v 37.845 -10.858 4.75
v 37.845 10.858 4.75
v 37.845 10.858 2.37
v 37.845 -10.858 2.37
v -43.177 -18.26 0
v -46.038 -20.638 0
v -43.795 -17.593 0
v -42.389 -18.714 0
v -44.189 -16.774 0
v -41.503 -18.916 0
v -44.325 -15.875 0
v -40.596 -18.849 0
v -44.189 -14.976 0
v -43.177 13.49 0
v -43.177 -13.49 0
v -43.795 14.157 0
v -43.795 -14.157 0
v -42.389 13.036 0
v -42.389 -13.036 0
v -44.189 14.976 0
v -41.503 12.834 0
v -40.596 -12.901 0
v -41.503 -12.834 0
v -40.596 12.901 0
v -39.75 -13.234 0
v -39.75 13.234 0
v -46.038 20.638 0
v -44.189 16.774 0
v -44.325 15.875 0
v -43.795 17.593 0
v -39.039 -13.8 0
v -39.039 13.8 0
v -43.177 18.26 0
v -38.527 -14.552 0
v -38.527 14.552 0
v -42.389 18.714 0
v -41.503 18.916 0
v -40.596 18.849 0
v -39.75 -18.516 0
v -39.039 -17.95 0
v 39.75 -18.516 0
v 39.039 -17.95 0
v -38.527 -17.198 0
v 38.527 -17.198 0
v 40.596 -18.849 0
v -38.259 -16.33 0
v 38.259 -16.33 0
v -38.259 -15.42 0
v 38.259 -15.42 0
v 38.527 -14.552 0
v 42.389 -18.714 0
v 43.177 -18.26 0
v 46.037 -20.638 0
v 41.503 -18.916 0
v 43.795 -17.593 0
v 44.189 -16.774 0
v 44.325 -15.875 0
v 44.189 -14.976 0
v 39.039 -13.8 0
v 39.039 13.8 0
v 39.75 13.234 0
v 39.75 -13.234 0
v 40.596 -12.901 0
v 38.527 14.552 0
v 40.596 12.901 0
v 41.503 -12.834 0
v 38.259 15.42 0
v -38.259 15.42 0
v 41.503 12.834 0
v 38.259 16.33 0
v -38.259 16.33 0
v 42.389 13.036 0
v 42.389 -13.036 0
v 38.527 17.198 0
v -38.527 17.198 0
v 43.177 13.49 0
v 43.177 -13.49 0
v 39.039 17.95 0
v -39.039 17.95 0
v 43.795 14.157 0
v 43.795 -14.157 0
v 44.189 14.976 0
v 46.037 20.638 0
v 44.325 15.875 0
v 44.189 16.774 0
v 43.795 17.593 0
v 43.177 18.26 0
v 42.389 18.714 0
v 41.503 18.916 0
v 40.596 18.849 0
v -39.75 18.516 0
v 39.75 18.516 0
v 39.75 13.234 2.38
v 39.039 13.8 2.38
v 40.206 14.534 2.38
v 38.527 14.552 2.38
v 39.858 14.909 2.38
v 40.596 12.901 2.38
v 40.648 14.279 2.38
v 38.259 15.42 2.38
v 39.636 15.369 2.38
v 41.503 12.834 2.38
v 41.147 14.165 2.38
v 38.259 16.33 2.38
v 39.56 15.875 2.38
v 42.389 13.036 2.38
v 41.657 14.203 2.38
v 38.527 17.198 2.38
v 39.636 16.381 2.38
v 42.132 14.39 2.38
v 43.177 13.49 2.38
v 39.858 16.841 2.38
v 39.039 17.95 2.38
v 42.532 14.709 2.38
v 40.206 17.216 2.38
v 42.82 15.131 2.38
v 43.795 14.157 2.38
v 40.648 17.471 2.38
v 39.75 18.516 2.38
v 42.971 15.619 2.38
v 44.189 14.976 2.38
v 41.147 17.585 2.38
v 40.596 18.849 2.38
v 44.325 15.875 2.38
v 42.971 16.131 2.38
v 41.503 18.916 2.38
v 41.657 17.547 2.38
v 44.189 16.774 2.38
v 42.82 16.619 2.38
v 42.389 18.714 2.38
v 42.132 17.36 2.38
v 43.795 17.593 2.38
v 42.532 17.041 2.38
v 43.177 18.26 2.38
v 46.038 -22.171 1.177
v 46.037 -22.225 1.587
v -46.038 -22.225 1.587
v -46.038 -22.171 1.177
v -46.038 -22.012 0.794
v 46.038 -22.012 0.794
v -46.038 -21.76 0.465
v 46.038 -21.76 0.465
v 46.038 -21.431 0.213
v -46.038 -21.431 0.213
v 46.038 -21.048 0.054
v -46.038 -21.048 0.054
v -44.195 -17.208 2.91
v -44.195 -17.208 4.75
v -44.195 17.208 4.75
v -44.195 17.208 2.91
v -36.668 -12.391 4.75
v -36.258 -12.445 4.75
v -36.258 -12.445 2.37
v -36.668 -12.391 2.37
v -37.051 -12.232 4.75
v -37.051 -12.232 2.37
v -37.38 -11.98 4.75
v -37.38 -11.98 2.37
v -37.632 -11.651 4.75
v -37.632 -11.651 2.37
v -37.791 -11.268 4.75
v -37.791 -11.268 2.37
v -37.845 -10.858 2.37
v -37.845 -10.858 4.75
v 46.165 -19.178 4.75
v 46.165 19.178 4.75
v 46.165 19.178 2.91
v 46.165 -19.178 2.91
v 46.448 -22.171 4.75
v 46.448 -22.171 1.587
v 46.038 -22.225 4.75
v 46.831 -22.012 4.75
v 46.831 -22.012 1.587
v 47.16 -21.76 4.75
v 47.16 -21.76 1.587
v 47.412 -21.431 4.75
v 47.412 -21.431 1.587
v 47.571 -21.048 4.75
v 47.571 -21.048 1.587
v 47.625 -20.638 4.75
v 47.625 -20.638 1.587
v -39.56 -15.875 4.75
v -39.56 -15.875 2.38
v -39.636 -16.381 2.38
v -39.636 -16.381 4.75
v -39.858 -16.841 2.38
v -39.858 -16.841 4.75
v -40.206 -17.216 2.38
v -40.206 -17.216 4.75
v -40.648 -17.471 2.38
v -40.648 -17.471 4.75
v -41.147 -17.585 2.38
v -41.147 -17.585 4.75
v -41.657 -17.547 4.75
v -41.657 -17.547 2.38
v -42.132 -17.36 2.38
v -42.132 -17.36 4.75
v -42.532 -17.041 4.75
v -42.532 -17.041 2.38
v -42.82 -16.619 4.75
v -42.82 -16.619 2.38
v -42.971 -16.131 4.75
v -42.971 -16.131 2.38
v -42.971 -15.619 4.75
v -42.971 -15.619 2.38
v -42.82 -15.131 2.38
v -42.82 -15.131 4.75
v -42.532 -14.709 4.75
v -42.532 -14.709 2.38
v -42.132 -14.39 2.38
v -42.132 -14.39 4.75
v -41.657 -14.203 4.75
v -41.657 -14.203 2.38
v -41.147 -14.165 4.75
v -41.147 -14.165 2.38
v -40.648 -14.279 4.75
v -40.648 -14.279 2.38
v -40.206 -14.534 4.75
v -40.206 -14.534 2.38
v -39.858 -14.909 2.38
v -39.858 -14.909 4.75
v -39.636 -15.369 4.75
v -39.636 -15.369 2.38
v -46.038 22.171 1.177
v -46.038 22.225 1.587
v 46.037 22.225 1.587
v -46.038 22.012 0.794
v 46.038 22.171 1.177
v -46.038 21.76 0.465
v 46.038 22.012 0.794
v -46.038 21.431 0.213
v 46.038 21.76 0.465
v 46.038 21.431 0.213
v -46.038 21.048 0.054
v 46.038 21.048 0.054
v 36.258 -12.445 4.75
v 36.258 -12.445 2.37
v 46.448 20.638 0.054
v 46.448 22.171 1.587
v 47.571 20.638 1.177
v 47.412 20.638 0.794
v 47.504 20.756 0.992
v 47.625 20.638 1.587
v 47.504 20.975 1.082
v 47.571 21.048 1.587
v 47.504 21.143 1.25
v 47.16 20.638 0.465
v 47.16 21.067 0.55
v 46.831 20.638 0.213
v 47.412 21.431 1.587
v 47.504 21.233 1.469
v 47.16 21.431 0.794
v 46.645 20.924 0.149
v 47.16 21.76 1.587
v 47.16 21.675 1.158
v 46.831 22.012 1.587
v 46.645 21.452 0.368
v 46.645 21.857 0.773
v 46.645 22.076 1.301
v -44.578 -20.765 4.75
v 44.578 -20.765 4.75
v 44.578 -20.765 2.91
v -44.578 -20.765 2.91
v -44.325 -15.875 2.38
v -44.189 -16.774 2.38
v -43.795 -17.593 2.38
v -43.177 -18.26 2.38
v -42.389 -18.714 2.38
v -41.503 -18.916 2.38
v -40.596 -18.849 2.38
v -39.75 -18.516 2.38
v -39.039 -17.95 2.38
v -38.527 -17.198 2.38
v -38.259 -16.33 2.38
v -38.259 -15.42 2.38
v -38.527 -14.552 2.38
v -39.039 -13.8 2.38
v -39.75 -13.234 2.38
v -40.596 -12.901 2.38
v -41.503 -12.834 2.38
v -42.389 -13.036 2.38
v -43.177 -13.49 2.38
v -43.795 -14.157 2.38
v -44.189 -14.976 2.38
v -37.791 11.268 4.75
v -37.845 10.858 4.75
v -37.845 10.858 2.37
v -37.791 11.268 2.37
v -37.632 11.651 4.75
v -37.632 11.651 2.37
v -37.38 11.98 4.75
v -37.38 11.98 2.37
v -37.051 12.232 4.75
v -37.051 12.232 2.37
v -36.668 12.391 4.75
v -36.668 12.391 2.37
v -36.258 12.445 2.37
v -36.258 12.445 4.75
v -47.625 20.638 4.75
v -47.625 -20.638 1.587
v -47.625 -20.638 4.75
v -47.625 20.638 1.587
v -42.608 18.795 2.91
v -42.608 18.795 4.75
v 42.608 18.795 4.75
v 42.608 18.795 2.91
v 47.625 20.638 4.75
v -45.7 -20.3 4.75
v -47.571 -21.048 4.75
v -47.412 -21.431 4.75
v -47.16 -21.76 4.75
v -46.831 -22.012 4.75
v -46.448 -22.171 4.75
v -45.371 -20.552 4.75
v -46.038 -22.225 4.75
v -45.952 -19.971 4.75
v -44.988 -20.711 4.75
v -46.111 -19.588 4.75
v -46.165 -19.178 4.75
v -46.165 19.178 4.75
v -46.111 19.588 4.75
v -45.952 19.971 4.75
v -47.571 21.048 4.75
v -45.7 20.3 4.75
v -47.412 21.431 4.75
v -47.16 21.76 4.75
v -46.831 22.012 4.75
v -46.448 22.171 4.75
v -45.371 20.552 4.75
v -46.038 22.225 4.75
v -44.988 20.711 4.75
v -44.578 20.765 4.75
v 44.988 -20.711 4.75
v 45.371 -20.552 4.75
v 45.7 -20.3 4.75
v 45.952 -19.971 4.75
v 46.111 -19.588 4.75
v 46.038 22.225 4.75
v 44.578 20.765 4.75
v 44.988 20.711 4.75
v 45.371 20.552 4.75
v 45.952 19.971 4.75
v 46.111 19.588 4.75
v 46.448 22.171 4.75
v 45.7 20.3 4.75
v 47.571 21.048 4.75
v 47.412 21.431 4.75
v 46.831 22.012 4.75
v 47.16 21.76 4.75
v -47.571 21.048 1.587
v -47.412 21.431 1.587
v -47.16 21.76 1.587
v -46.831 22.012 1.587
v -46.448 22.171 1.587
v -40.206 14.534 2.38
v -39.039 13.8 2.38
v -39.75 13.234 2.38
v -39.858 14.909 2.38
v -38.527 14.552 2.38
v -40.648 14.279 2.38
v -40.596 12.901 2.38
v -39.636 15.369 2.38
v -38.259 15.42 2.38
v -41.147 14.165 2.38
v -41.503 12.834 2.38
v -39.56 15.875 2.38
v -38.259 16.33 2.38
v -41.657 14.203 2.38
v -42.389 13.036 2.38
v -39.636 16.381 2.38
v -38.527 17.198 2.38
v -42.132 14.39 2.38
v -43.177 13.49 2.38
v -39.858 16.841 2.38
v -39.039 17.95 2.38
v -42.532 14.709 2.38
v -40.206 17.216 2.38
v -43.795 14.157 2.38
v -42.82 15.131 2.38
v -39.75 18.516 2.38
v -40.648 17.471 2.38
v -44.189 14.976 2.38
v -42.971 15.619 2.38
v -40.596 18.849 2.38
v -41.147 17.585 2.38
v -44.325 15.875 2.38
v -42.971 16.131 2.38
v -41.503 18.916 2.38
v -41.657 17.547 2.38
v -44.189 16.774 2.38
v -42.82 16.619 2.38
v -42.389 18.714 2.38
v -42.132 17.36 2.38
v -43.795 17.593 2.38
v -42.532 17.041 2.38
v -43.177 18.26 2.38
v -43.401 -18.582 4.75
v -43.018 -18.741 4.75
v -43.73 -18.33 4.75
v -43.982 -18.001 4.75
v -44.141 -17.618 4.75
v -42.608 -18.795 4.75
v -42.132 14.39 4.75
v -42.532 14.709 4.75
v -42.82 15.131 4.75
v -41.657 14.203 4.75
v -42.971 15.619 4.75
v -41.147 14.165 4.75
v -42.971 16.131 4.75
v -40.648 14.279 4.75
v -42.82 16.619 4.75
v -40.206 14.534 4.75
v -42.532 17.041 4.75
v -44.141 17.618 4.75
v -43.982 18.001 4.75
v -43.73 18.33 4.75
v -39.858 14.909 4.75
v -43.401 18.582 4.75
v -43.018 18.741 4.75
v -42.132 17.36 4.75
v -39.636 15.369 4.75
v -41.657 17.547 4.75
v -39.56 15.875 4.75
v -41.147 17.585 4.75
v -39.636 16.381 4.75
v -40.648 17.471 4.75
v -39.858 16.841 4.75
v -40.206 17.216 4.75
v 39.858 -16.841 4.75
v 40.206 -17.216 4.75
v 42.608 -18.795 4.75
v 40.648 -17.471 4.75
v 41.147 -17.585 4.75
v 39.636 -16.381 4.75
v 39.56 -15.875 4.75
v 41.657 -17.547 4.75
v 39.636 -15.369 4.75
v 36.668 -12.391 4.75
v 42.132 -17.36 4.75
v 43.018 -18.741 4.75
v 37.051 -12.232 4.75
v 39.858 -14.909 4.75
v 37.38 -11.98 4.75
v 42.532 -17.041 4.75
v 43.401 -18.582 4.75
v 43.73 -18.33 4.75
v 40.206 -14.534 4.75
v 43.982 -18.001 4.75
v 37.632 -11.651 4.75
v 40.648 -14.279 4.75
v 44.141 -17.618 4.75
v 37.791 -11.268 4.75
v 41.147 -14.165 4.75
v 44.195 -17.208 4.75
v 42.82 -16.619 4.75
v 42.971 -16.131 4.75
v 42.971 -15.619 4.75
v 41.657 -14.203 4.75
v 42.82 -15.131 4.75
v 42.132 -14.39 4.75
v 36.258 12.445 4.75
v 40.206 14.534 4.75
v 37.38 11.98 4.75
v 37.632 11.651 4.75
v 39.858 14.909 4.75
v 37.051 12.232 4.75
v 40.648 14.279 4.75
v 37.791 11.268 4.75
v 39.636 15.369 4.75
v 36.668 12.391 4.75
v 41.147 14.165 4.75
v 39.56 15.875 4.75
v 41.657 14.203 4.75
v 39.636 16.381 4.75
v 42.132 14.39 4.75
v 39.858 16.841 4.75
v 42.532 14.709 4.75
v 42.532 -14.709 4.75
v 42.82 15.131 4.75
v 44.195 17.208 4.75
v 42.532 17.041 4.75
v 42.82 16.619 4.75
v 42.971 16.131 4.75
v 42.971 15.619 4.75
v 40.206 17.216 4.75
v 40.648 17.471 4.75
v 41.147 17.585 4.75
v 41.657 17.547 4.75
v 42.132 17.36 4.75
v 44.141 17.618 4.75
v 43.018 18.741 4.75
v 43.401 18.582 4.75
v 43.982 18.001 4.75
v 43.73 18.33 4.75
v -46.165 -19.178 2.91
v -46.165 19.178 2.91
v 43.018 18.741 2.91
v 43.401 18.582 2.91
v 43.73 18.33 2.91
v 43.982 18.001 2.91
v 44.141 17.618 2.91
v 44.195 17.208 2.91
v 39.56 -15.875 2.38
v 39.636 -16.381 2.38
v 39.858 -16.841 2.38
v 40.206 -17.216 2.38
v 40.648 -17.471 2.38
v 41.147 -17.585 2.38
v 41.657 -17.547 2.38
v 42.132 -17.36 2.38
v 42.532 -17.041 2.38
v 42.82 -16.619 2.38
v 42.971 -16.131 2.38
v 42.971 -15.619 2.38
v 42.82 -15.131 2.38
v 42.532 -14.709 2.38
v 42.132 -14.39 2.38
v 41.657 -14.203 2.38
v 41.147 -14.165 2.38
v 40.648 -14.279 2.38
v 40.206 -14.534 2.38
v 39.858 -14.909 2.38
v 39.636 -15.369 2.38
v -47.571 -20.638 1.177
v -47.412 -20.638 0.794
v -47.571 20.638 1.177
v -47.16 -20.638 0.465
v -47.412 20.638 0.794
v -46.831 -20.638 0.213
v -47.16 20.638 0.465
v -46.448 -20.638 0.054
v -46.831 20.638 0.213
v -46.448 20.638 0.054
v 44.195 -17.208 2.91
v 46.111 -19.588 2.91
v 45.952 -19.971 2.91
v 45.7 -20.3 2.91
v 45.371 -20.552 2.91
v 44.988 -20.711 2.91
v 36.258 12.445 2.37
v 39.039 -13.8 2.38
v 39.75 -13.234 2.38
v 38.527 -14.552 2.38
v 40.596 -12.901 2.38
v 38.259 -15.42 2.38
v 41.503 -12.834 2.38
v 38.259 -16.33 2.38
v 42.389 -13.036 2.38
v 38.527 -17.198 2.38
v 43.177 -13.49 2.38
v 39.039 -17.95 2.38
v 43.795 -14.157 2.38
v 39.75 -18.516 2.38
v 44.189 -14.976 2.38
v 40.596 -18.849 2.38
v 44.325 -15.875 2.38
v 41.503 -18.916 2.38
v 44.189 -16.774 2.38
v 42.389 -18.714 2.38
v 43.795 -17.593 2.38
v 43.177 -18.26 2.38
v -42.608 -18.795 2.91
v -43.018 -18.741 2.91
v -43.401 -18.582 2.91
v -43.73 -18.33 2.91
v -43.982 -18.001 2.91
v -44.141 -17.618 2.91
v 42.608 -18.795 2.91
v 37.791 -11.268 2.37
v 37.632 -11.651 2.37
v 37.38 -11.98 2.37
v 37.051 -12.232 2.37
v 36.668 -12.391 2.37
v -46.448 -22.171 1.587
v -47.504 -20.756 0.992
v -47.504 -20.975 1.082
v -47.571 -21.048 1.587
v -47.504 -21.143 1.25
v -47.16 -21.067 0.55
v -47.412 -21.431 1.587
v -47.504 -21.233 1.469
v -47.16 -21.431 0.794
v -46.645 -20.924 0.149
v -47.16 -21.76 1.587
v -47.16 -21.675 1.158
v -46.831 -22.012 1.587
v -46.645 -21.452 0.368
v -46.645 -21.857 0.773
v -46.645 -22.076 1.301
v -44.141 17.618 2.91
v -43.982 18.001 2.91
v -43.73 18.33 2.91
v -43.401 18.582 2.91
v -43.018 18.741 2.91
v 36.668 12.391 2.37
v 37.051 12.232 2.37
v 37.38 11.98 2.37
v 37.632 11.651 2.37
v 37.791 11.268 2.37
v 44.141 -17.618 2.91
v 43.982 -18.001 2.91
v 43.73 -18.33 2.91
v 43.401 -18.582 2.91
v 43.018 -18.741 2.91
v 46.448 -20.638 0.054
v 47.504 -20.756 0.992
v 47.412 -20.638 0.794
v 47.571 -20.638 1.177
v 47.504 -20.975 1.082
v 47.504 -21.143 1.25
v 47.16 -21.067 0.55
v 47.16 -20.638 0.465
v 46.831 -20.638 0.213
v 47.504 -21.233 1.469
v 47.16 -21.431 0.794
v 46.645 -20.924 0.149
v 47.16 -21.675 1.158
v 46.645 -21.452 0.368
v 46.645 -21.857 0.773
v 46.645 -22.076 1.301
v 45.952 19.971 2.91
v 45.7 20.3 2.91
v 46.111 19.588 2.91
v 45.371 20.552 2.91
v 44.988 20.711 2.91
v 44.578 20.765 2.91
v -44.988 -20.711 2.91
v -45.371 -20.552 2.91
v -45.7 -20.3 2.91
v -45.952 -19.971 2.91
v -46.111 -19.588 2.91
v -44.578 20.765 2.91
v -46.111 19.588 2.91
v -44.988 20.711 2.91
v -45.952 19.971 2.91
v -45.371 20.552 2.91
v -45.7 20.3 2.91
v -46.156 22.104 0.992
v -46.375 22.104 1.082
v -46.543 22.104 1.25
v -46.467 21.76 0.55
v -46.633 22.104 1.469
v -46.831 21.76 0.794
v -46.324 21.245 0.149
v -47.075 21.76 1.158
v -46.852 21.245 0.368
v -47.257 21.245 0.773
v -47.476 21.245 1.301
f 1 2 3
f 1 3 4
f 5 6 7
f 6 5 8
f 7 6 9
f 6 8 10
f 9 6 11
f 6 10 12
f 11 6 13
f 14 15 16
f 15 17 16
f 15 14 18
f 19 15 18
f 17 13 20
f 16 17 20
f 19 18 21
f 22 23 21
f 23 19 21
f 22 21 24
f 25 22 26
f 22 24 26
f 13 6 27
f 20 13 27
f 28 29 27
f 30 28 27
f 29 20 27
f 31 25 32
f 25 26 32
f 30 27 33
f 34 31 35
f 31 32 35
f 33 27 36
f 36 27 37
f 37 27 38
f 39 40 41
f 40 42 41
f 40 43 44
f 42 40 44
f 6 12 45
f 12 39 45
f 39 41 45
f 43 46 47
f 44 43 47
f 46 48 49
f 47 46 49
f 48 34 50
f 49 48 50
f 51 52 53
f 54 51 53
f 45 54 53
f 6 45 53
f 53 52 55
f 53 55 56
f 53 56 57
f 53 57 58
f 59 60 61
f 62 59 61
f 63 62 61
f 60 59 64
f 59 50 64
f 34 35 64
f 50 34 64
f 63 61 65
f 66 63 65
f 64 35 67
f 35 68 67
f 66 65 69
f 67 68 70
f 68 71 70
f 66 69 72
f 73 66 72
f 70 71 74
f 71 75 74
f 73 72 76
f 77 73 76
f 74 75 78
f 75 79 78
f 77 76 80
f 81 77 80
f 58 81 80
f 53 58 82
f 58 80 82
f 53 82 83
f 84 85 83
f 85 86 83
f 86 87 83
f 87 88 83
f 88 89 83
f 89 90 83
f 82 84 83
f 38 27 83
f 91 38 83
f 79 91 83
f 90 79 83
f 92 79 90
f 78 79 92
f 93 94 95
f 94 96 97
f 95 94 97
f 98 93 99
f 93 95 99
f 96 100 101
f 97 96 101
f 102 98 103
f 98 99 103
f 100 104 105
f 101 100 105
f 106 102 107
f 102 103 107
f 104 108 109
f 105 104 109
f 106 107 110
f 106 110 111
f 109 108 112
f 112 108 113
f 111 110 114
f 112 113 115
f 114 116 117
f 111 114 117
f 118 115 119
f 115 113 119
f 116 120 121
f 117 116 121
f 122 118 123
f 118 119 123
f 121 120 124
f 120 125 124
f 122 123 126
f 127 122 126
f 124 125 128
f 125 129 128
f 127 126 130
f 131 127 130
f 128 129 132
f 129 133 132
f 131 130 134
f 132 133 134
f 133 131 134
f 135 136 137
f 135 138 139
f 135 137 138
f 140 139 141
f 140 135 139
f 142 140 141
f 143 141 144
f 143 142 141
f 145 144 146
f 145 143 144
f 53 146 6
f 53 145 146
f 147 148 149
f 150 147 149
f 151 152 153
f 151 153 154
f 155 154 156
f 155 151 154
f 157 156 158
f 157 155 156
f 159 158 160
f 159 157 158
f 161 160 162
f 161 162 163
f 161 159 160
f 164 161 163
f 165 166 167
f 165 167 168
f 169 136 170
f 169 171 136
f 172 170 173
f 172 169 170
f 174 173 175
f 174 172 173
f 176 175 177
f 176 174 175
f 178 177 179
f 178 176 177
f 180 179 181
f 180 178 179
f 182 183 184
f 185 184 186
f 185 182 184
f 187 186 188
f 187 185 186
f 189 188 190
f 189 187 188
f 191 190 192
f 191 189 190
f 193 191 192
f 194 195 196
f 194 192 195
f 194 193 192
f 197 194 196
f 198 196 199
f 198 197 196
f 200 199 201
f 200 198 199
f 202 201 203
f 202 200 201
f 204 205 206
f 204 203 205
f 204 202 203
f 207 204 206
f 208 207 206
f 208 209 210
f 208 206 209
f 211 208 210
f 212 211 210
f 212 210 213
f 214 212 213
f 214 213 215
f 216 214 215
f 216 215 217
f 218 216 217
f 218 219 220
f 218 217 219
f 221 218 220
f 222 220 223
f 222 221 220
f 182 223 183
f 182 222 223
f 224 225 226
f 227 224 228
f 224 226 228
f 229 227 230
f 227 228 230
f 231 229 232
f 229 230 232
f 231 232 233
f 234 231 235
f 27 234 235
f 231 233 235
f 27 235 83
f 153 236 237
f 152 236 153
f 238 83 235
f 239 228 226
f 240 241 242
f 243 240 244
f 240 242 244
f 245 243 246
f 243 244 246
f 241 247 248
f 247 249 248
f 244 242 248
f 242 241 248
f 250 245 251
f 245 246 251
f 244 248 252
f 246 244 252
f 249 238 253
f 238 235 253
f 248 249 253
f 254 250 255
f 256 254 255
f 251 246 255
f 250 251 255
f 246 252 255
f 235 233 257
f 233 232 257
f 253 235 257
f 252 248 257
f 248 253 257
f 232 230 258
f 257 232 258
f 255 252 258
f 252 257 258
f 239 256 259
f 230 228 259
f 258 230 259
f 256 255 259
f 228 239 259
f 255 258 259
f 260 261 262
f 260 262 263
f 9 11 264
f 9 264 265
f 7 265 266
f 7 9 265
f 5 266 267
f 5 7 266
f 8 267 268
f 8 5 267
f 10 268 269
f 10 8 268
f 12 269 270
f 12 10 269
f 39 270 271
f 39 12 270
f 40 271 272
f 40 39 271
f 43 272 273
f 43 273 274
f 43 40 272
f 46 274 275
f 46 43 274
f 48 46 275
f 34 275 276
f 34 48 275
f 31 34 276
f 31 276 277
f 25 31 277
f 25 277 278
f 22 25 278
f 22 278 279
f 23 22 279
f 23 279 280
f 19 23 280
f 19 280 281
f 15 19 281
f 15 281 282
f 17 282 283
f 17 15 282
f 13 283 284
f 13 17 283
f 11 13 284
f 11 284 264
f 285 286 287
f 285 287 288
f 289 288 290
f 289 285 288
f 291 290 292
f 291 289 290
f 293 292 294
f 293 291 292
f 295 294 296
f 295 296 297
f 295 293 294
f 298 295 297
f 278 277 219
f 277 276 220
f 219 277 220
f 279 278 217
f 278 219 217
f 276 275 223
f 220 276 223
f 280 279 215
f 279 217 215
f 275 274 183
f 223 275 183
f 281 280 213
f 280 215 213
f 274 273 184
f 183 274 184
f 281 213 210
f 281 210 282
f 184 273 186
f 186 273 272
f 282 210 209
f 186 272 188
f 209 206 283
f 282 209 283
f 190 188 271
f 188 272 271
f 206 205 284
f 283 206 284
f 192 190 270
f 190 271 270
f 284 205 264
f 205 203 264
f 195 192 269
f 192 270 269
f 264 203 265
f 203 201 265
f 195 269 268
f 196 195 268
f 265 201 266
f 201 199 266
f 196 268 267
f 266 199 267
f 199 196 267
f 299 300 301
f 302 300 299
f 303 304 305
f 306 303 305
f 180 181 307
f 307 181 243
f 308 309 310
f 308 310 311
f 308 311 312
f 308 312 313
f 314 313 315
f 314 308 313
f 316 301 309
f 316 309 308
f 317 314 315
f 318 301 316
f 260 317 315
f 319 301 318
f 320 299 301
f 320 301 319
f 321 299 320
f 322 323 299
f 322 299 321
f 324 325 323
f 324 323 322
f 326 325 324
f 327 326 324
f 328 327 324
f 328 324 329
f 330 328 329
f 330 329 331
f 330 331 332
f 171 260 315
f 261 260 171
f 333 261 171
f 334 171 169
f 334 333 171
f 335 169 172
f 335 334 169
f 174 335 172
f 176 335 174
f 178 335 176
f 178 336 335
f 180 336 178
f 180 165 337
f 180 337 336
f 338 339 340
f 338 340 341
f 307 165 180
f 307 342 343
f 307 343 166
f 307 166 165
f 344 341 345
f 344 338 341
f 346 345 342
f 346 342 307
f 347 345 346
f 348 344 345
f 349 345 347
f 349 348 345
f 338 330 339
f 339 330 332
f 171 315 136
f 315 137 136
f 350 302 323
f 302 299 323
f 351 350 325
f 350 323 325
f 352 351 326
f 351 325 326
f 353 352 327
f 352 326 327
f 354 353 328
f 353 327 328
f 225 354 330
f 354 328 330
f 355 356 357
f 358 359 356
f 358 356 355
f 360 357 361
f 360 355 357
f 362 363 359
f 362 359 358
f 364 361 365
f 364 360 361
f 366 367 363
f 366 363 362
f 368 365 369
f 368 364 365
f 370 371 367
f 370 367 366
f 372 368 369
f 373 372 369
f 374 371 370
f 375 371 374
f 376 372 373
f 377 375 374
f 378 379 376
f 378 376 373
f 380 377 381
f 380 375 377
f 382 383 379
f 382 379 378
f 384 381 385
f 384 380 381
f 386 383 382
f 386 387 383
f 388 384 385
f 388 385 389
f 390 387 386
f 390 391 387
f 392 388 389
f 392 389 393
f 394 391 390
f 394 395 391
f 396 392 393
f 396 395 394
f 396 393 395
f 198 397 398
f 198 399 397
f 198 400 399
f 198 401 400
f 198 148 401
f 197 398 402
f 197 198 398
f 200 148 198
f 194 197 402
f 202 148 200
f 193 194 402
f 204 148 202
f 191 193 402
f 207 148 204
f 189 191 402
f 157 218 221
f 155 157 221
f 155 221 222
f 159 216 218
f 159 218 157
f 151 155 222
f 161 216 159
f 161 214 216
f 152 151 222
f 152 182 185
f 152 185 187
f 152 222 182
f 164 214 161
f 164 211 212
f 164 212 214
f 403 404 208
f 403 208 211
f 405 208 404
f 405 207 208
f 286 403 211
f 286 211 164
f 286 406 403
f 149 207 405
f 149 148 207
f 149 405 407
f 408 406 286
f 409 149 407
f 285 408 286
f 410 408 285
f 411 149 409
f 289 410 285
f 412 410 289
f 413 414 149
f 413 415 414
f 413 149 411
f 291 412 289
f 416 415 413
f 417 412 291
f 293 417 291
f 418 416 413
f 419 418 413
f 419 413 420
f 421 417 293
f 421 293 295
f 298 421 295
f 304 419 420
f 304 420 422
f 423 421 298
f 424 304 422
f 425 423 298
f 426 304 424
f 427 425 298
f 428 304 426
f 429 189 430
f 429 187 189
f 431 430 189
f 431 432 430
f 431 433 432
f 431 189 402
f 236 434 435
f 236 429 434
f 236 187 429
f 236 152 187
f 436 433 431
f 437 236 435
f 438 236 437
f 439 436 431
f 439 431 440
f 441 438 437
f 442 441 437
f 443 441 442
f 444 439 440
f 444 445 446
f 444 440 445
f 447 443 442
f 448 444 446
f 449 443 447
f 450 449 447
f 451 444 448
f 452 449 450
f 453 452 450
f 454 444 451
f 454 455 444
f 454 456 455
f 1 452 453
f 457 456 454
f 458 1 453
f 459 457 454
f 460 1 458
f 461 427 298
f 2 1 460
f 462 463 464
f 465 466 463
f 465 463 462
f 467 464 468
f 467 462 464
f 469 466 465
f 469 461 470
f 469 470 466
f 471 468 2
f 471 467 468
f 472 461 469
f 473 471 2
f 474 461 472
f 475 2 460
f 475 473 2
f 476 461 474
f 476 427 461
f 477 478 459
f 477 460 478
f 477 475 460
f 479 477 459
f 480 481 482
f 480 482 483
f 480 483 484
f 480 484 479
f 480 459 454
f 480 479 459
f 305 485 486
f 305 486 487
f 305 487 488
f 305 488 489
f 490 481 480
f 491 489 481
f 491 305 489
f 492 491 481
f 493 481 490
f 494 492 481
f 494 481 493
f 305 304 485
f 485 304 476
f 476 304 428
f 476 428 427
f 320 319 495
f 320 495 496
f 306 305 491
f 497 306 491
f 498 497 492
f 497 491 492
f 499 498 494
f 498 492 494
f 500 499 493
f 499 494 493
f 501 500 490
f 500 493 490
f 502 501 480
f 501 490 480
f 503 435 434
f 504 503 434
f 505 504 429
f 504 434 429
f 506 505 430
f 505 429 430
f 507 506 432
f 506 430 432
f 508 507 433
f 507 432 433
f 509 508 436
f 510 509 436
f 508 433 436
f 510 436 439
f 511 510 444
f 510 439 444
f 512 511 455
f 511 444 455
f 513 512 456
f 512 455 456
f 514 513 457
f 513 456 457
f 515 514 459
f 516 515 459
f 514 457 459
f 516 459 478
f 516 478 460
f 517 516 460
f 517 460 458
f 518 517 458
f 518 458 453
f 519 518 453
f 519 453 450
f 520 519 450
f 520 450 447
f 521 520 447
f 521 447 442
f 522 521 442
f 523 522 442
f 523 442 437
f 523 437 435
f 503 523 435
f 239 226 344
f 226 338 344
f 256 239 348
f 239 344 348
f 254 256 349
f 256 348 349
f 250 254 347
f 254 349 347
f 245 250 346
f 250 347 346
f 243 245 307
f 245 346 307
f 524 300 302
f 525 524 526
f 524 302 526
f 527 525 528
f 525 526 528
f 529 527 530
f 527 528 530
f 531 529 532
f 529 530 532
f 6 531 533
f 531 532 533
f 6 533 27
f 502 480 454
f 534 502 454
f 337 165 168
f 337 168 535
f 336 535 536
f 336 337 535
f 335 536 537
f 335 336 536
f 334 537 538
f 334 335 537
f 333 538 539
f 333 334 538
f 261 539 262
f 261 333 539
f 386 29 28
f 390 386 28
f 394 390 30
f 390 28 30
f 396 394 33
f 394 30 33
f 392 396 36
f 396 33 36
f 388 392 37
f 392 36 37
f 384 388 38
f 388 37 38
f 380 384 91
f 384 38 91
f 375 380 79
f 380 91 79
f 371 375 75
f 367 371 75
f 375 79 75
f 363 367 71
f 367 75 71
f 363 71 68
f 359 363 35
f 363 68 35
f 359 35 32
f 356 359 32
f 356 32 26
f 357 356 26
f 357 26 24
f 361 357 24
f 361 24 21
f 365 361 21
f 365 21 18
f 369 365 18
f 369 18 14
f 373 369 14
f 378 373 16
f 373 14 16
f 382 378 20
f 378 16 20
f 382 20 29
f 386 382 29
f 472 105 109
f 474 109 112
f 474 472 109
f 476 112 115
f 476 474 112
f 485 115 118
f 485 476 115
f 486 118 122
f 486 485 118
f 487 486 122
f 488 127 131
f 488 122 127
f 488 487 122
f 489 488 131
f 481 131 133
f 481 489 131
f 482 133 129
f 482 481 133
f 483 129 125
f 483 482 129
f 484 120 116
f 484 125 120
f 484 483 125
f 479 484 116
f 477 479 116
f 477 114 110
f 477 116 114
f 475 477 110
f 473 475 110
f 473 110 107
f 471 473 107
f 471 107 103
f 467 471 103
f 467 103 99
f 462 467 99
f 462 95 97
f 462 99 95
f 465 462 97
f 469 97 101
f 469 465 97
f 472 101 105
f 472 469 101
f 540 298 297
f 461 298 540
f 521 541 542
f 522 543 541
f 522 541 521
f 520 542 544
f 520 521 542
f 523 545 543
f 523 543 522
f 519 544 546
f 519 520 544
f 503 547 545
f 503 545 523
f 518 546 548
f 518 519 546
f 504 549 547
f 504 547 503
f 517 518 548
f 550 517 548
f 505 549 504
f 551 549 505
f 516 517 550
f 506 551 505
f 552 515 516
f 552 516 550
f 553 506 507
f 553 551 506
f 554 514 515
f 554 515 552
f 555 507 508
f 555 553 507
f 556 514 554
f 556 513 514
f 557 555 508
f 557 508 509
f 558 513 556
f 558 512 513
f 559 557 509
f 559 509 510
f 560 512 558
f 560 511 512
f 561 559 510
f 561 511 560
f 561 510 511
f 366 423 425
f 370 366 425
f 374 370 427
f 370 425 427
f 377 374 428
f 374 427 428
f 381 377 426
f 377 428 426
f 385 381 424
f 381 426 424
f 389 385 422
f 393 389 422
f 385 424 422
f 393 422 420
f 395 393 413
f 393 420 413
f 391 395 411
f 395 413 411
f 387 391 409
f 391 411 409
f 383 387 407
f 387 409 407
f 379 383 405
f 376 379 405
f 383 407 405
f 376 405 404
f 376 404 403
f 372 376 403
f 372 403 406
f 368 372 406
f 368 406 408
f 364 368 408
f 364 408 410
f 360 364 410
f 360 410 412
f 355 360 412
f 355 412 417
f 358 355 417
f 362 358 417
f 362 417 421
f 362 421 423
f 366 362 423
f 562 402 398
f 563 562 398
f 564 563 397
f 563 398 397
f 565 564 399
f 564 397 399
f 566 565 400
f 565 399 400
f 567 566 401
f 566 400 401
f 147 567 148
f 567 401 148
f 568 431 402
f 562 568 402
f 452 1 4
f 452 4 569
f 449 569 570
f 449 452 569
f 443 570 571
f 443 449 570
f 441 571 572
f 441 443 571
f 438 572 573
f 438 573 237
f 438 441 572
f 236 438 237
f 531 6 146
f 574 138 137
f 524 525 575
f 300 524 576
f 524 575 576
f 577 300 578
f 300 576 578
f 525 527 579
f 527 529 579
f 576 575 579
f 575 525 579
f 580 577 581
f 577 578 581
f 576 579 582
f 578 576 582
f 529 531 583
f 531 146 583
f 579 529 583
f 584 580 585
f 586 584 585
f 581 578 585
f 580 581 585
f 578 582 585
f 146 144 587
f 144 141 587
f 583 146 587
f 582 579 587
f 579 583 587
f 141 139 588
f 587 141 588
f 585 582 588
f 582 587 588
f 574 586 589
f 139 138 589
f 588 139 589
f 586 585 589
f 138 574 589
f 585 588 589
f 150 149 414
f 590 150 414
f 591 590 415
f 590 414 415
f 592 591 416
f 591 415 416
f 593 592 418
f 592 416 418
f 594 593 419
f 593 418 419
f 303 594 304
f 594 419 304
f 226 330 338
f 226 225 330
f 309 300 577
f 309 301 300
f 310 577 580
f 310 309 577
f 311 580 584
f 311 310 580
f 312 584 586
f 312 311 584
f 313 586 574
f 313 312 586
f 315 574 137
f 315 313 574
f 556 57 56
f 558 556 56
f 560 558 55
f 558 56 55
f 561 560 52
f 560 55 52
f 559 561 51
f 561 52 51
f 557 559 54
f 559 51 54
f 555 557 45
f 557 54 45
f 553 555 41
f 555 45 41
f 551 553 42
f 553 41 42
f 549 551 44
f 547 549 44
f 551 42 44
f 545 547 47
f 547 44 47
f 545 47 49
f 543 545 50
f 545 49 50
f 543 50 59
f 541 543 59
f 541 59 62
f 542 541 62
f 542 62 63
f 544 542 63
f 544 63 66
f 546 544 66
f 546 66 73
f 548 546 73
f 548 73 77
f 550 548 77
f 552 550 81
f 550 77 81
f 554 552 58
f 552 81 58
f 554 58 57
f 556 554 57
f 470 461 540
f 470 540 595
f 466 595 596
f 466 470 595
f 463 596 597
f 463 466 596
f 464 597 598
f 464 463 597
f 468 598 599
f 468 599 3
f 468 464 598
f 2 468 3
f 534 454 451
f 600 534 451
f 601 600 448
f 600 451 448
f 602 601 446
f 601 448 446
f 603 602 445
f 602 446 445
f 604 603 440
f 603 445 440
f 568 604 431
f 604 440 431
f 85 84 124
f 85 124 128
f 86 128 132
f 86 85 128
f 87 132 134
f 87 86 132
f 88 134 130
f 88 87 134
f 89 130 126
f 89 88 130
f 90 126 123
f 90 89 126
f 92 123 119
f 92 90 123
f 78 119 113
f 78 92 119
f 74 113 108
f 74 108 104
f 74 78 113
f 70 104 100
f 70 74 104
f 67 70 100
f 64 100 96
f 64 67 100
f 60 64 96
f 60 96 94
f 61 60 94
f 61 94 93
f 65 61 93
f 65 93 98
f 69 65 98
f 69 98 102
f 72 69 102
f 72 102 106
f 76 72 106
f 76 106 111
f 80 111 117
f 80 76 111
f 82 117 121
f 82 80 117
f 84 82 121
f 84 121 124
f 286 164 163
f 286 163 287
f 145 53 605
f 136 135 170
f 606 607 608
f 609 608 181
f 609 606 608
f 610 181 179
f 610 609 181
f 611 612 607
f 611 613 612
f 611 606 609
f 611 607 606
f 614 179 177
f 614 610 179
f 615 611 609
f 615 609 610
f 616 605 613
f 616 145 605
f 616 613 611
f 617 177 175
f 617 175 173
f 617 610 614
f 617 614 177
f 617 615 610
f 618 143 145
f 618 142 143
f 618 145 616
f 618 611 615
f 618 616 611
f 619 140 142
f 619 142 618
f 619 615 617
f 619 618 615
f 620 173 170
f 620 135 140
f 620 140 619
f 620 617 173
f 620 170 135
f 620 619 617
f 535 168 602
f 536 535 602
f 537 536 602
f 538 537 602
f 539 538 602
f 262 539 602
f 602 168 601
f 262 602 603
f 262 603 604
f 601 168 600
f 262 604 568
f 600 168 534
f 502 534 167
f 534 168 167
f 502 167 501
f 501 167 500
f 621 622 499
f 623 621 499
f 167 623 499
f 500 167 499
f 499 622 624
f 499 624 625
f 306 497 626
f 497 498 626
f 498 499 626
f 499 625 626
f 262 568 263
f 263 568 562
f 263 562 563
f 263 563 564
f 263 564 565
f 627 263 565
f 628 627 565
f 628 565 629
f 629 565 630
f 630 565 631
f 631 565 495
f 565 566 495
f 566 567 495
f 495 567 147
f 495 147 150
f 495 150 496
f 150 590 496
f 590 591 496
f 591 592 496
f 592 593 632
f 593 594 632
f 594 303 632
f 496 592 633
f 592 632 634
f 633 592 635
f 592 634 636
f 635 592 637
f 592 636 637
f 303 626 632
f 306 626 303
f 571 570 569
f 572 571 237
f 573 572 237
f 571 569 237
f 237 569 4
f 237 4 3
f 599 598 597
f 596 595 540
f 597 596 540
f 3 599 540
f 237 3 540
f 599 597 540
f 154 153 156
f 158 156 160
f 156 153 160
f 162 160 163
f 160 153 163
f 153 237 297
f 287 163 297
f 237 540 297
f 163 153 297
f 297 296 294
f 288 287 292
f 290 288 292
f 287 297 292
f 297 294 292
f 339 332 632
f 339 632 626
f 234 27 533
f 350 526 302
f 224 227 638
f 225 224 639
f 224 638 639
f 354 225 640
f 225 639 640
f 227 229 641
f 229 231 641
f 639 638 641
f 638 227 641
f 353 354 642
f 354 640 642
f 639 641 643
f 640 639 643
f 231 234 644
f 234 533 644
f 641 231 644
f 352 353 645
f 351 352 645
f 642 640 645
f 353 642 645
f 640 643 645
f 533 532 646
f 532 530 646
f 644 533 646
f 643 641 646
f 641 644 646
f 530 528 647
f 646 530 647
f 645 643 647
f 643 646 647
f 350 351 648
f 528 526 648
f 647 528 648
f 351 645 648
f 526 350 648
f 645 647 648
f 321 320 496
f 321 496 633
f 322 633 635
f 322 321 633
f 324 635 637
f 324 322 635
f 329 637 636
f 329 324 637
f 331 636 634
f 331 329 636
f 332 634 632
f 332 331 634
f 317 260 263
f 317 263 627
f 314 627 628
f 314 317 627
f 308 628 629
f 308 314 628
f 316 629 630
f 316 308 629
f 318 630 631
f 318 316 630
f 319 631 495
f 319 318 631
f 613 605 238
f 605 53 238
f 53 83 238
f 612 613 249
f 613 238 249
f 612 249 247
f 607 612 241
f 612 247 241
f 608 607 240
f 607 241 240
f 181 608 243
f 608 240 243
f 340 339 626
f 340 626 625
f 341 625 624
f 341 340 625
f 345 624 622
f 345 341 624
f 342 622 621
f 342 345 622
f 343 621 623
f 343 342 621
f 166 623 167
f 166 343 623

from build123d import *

# Parameters (mm, degrees)
SKETCH1_W                                  = 95.25
SKETCH1_H                                  = 44.45
BOSS_EXTRUDE1_DEPTH                        = 4.75
CUT_EXTRUDE1_DEPTH                         = 1.84
CUT_EXTRUDE2_DEPTH                         = 2.38
SKETCH4_R                                  = 1.714999999
CUT_EXTRUDE3_DEPTH                         = 53.769818552
SKETCH5_R                                  = 3.05
CUT_EXTRUDE4_DEPTH                         = 2.38
MIRROR1_AT_THE_SECOND_PLANE_COPY_1_SKETC_R = 1.714999999
MIRROR1_AT_THE_SECOND_PLANE_COPY_1_DEPTH   = 53.769818552
MIRROR1_AT_THE_SECOND_PLANE_COPY_2_SKETC_R = 3.05
MIRROR1_AT_THE_SECOND_PLANE_COPY_2_DEPTH   = 2.38
FILLET1_R                                  = 1.5875


with BuildPart() as part:
    # Sketch1 → Boss-Extrude1 (new body)
    with BuildSketch(Plane.XY):
        Rectangle(SKETCH1_W, SKETCH1_H)
    extrude(amount=BOSS_EXTRUDE1_DEPTH)

    # Sketch2 → Cut-Extrude1 (cut)
    with BuildSketch(Plane.XY.offset(4.75)):
        with BuildLine():
            ThreePointArc((-46.165, 19.1775), (-45.700032015, 20.300032015), (-44.5775, 20.765))
            Line((-44.5775, 20.765), (44.5775, 20.765))
            ThreePointArc((44.5775, 20.765), (45.700032015, 20.300032015), (46.165, 19.1775))
            Line((46.165, 19.1775), (46.165, -19.1775))
            ThreePointArc((46.165, -19.1775), (45.700032015, -20.300032015), (44.5775, -20.765))
            Line((44.5775, -20.765), (-44.5775, -20.765))
            ThreePointArc((-44.5775, -20.765), (-45.700032015, -20.300032015), (-46.165, -19.1775))
            Line((-46.165, -19.1775), (-46.165, 19.1775))
        make_face()
        with BuildLine():
            Line((-44.195, -17.2075), (-44.195, 17.2075))
            ThreePointArc((-44.195, 17.2075), (-43.730032015, 18.330032015), (-42.6075, 18.795))
            Line((-42.6075, 18.795), (42.6075, 18.795))
            ThreePointArc((42.6075, 18.795), (43.730032015, 18.330032015), (44.195, 17.2075))
            Line((44.195, 17.2075), (44.195, -17.2075))
            ThreePointArc((44.195, -17.2075), (43.730032015, -18.330032015), (42.6075, -18.795))
            Line((42.6075, -18.795), (-42.6075, -18.795))
            ThreePointArc((-42.6075, -18.795), (-43.730032015, -18.330032015), (-44.195, -17.2075))
        make_face(mode=Mode.SUBTRACT)
    extrude(amount=-CUT_EXTRUDE1_DEPTH, mode=Mode.SUBTRACT)

    # Sketch3 → Cut-Extrude2 (cut)
    with BuildSketch(Plane.XY.offset(4.75)):
        with BuildLine():
            Line((-36.257500002, 12.445), (36.257500002, 12.445))
            ThreePointArc((36.257500002, 12.445), (37.380032017, 11.980032015), (37.845000002, 10.8575))
            Line((37.845000002, 10.8575), (37.845000002, -10.8575))
            ThreePointArc((37.845000002, -10.8575), (37.380032017, -11.980032015), (36.257500002, -12.445))
            Line((36.257500002, -12.445), (-36.257500002, -12.445))
            ThreePointArc((-36.257500002, -12.445), (-37.380032017, -11.980032015), (-37.845000002, -10.8575))
            Line((-37.845000002, -10.8575), (-37.845000002, 10.8575))
            ThreePointArc((-37.845000002, 10.8575), (-37.380032017, 11.980032015), (-36.257500002, 12.445))
        make_face()
    extrude(amount=-CUT_EXTRUDE2_DEPTH, mode=Mode.SUBTRACT)

    # Sketch4 → Cut-Extrude3 (cut, through all)
    with BuildSketch(Plane.XY.offset(4.75)):
        with Locations((-41.275, 15.875)):
            Circle(SKETCH4_R)
    cut_extrude3 = extrude(amount=-CUT_EXTRUDE3_DEPTH, mode=Mode.SUBTRACT)

    # Sketch5 → Cut-Extrude4 (cut)
    with BuildSketch(Plane(origin=(0, 0, 0), x_dir=(-1, 0, 0), z_dir=(0, 0, -1))):
        with Locations((41.275, 15.875)):
            Circle(SKETCH5_R)
    cut_extrude4 = extrude(amount=-CUT_EXTRUDE4_DEPTH, mode=Mode.SUBTRACT)

    # Mirror1: Cut-Extrude3, Cut-Extrude4 across plane
    add(cut_extrude3.mirror(Plane(origin=(0, 0, 0), x_dir=(0, 0, 1), z_dir=(1, 0, 0))), mode=Mode.SUBTRACT)
    add(cut_extrude4.mirror(Plane(origin=(0, 0, 0), x_dir=(0, 0, 1), z_dir=(1, 0, 0))), mode=Mode.SUBTRACT)

    # Mirror1 at the second plane: Cut-Extrude3, Cut-Extrude4 across plane
    add(cut_extrude3.mirror(Plane.ZX), mode=Mode.SUBTRACT)
    add(cut_extrude4.mirror(Plane.ZX), mode=Mode.SUBTRACT)

    # Mirror1 at the second plane copy 1 sketc → Mirror1 at the second plane copy 1 (cut, through all)
    with BuildSketch(Plane(origin=(0, 0, 4.75), x_dir=(-1, 0, 0), z_dir=(0, 0, 1))):
        with Locations((-41.275, 15.875)):
            Circle(MIRROR1_AT_THE_SECOND_PLANE_COPY_1_SKETC_R)
    extrude(amount=-MIRROR1_AT_THE_SECOND_PLANE_COPY_1_DEPTH, mode=Mode.SUBTRACT)

    # Mirror1 at the second plane copy 2 sketc → Mirror1 at the second plane copy 2 (cut)
    with BuildSketch(Plane(origin=(0, 0, 0), x_dir=(1, 0, 0), z_dir=(0, 0, -1))):
        with Locations((41.275, 15.875)):
            Circle(MIRROR1_AT_THE_SECOND_PLANE_COPY_2_SKETC_R)
    extrude(amount=-MIRROR1_AT_THE_SECOND_PLANE_COPY_2_DEPTH, mode=Mode.SUBTRACT)

    # Fillet1
    fillet1_edges = [part.edges().sort_by_distance(p)[0] for p in [
        (0, -22.225, 0),
        (-47.625, 0, 0),
        (0, 22.225, 0),
        (47.625, 0, 0),
        (47.625, -22.225, 2.375),
        (-47.625, -22.225, 2.375),
        (-47.625, 22.225, 2.375),
        (47.625, 22.225, 2.375),
    ]]
    fillet(fillet1_edges, radius=FILLET1_R)


solid = part.part
